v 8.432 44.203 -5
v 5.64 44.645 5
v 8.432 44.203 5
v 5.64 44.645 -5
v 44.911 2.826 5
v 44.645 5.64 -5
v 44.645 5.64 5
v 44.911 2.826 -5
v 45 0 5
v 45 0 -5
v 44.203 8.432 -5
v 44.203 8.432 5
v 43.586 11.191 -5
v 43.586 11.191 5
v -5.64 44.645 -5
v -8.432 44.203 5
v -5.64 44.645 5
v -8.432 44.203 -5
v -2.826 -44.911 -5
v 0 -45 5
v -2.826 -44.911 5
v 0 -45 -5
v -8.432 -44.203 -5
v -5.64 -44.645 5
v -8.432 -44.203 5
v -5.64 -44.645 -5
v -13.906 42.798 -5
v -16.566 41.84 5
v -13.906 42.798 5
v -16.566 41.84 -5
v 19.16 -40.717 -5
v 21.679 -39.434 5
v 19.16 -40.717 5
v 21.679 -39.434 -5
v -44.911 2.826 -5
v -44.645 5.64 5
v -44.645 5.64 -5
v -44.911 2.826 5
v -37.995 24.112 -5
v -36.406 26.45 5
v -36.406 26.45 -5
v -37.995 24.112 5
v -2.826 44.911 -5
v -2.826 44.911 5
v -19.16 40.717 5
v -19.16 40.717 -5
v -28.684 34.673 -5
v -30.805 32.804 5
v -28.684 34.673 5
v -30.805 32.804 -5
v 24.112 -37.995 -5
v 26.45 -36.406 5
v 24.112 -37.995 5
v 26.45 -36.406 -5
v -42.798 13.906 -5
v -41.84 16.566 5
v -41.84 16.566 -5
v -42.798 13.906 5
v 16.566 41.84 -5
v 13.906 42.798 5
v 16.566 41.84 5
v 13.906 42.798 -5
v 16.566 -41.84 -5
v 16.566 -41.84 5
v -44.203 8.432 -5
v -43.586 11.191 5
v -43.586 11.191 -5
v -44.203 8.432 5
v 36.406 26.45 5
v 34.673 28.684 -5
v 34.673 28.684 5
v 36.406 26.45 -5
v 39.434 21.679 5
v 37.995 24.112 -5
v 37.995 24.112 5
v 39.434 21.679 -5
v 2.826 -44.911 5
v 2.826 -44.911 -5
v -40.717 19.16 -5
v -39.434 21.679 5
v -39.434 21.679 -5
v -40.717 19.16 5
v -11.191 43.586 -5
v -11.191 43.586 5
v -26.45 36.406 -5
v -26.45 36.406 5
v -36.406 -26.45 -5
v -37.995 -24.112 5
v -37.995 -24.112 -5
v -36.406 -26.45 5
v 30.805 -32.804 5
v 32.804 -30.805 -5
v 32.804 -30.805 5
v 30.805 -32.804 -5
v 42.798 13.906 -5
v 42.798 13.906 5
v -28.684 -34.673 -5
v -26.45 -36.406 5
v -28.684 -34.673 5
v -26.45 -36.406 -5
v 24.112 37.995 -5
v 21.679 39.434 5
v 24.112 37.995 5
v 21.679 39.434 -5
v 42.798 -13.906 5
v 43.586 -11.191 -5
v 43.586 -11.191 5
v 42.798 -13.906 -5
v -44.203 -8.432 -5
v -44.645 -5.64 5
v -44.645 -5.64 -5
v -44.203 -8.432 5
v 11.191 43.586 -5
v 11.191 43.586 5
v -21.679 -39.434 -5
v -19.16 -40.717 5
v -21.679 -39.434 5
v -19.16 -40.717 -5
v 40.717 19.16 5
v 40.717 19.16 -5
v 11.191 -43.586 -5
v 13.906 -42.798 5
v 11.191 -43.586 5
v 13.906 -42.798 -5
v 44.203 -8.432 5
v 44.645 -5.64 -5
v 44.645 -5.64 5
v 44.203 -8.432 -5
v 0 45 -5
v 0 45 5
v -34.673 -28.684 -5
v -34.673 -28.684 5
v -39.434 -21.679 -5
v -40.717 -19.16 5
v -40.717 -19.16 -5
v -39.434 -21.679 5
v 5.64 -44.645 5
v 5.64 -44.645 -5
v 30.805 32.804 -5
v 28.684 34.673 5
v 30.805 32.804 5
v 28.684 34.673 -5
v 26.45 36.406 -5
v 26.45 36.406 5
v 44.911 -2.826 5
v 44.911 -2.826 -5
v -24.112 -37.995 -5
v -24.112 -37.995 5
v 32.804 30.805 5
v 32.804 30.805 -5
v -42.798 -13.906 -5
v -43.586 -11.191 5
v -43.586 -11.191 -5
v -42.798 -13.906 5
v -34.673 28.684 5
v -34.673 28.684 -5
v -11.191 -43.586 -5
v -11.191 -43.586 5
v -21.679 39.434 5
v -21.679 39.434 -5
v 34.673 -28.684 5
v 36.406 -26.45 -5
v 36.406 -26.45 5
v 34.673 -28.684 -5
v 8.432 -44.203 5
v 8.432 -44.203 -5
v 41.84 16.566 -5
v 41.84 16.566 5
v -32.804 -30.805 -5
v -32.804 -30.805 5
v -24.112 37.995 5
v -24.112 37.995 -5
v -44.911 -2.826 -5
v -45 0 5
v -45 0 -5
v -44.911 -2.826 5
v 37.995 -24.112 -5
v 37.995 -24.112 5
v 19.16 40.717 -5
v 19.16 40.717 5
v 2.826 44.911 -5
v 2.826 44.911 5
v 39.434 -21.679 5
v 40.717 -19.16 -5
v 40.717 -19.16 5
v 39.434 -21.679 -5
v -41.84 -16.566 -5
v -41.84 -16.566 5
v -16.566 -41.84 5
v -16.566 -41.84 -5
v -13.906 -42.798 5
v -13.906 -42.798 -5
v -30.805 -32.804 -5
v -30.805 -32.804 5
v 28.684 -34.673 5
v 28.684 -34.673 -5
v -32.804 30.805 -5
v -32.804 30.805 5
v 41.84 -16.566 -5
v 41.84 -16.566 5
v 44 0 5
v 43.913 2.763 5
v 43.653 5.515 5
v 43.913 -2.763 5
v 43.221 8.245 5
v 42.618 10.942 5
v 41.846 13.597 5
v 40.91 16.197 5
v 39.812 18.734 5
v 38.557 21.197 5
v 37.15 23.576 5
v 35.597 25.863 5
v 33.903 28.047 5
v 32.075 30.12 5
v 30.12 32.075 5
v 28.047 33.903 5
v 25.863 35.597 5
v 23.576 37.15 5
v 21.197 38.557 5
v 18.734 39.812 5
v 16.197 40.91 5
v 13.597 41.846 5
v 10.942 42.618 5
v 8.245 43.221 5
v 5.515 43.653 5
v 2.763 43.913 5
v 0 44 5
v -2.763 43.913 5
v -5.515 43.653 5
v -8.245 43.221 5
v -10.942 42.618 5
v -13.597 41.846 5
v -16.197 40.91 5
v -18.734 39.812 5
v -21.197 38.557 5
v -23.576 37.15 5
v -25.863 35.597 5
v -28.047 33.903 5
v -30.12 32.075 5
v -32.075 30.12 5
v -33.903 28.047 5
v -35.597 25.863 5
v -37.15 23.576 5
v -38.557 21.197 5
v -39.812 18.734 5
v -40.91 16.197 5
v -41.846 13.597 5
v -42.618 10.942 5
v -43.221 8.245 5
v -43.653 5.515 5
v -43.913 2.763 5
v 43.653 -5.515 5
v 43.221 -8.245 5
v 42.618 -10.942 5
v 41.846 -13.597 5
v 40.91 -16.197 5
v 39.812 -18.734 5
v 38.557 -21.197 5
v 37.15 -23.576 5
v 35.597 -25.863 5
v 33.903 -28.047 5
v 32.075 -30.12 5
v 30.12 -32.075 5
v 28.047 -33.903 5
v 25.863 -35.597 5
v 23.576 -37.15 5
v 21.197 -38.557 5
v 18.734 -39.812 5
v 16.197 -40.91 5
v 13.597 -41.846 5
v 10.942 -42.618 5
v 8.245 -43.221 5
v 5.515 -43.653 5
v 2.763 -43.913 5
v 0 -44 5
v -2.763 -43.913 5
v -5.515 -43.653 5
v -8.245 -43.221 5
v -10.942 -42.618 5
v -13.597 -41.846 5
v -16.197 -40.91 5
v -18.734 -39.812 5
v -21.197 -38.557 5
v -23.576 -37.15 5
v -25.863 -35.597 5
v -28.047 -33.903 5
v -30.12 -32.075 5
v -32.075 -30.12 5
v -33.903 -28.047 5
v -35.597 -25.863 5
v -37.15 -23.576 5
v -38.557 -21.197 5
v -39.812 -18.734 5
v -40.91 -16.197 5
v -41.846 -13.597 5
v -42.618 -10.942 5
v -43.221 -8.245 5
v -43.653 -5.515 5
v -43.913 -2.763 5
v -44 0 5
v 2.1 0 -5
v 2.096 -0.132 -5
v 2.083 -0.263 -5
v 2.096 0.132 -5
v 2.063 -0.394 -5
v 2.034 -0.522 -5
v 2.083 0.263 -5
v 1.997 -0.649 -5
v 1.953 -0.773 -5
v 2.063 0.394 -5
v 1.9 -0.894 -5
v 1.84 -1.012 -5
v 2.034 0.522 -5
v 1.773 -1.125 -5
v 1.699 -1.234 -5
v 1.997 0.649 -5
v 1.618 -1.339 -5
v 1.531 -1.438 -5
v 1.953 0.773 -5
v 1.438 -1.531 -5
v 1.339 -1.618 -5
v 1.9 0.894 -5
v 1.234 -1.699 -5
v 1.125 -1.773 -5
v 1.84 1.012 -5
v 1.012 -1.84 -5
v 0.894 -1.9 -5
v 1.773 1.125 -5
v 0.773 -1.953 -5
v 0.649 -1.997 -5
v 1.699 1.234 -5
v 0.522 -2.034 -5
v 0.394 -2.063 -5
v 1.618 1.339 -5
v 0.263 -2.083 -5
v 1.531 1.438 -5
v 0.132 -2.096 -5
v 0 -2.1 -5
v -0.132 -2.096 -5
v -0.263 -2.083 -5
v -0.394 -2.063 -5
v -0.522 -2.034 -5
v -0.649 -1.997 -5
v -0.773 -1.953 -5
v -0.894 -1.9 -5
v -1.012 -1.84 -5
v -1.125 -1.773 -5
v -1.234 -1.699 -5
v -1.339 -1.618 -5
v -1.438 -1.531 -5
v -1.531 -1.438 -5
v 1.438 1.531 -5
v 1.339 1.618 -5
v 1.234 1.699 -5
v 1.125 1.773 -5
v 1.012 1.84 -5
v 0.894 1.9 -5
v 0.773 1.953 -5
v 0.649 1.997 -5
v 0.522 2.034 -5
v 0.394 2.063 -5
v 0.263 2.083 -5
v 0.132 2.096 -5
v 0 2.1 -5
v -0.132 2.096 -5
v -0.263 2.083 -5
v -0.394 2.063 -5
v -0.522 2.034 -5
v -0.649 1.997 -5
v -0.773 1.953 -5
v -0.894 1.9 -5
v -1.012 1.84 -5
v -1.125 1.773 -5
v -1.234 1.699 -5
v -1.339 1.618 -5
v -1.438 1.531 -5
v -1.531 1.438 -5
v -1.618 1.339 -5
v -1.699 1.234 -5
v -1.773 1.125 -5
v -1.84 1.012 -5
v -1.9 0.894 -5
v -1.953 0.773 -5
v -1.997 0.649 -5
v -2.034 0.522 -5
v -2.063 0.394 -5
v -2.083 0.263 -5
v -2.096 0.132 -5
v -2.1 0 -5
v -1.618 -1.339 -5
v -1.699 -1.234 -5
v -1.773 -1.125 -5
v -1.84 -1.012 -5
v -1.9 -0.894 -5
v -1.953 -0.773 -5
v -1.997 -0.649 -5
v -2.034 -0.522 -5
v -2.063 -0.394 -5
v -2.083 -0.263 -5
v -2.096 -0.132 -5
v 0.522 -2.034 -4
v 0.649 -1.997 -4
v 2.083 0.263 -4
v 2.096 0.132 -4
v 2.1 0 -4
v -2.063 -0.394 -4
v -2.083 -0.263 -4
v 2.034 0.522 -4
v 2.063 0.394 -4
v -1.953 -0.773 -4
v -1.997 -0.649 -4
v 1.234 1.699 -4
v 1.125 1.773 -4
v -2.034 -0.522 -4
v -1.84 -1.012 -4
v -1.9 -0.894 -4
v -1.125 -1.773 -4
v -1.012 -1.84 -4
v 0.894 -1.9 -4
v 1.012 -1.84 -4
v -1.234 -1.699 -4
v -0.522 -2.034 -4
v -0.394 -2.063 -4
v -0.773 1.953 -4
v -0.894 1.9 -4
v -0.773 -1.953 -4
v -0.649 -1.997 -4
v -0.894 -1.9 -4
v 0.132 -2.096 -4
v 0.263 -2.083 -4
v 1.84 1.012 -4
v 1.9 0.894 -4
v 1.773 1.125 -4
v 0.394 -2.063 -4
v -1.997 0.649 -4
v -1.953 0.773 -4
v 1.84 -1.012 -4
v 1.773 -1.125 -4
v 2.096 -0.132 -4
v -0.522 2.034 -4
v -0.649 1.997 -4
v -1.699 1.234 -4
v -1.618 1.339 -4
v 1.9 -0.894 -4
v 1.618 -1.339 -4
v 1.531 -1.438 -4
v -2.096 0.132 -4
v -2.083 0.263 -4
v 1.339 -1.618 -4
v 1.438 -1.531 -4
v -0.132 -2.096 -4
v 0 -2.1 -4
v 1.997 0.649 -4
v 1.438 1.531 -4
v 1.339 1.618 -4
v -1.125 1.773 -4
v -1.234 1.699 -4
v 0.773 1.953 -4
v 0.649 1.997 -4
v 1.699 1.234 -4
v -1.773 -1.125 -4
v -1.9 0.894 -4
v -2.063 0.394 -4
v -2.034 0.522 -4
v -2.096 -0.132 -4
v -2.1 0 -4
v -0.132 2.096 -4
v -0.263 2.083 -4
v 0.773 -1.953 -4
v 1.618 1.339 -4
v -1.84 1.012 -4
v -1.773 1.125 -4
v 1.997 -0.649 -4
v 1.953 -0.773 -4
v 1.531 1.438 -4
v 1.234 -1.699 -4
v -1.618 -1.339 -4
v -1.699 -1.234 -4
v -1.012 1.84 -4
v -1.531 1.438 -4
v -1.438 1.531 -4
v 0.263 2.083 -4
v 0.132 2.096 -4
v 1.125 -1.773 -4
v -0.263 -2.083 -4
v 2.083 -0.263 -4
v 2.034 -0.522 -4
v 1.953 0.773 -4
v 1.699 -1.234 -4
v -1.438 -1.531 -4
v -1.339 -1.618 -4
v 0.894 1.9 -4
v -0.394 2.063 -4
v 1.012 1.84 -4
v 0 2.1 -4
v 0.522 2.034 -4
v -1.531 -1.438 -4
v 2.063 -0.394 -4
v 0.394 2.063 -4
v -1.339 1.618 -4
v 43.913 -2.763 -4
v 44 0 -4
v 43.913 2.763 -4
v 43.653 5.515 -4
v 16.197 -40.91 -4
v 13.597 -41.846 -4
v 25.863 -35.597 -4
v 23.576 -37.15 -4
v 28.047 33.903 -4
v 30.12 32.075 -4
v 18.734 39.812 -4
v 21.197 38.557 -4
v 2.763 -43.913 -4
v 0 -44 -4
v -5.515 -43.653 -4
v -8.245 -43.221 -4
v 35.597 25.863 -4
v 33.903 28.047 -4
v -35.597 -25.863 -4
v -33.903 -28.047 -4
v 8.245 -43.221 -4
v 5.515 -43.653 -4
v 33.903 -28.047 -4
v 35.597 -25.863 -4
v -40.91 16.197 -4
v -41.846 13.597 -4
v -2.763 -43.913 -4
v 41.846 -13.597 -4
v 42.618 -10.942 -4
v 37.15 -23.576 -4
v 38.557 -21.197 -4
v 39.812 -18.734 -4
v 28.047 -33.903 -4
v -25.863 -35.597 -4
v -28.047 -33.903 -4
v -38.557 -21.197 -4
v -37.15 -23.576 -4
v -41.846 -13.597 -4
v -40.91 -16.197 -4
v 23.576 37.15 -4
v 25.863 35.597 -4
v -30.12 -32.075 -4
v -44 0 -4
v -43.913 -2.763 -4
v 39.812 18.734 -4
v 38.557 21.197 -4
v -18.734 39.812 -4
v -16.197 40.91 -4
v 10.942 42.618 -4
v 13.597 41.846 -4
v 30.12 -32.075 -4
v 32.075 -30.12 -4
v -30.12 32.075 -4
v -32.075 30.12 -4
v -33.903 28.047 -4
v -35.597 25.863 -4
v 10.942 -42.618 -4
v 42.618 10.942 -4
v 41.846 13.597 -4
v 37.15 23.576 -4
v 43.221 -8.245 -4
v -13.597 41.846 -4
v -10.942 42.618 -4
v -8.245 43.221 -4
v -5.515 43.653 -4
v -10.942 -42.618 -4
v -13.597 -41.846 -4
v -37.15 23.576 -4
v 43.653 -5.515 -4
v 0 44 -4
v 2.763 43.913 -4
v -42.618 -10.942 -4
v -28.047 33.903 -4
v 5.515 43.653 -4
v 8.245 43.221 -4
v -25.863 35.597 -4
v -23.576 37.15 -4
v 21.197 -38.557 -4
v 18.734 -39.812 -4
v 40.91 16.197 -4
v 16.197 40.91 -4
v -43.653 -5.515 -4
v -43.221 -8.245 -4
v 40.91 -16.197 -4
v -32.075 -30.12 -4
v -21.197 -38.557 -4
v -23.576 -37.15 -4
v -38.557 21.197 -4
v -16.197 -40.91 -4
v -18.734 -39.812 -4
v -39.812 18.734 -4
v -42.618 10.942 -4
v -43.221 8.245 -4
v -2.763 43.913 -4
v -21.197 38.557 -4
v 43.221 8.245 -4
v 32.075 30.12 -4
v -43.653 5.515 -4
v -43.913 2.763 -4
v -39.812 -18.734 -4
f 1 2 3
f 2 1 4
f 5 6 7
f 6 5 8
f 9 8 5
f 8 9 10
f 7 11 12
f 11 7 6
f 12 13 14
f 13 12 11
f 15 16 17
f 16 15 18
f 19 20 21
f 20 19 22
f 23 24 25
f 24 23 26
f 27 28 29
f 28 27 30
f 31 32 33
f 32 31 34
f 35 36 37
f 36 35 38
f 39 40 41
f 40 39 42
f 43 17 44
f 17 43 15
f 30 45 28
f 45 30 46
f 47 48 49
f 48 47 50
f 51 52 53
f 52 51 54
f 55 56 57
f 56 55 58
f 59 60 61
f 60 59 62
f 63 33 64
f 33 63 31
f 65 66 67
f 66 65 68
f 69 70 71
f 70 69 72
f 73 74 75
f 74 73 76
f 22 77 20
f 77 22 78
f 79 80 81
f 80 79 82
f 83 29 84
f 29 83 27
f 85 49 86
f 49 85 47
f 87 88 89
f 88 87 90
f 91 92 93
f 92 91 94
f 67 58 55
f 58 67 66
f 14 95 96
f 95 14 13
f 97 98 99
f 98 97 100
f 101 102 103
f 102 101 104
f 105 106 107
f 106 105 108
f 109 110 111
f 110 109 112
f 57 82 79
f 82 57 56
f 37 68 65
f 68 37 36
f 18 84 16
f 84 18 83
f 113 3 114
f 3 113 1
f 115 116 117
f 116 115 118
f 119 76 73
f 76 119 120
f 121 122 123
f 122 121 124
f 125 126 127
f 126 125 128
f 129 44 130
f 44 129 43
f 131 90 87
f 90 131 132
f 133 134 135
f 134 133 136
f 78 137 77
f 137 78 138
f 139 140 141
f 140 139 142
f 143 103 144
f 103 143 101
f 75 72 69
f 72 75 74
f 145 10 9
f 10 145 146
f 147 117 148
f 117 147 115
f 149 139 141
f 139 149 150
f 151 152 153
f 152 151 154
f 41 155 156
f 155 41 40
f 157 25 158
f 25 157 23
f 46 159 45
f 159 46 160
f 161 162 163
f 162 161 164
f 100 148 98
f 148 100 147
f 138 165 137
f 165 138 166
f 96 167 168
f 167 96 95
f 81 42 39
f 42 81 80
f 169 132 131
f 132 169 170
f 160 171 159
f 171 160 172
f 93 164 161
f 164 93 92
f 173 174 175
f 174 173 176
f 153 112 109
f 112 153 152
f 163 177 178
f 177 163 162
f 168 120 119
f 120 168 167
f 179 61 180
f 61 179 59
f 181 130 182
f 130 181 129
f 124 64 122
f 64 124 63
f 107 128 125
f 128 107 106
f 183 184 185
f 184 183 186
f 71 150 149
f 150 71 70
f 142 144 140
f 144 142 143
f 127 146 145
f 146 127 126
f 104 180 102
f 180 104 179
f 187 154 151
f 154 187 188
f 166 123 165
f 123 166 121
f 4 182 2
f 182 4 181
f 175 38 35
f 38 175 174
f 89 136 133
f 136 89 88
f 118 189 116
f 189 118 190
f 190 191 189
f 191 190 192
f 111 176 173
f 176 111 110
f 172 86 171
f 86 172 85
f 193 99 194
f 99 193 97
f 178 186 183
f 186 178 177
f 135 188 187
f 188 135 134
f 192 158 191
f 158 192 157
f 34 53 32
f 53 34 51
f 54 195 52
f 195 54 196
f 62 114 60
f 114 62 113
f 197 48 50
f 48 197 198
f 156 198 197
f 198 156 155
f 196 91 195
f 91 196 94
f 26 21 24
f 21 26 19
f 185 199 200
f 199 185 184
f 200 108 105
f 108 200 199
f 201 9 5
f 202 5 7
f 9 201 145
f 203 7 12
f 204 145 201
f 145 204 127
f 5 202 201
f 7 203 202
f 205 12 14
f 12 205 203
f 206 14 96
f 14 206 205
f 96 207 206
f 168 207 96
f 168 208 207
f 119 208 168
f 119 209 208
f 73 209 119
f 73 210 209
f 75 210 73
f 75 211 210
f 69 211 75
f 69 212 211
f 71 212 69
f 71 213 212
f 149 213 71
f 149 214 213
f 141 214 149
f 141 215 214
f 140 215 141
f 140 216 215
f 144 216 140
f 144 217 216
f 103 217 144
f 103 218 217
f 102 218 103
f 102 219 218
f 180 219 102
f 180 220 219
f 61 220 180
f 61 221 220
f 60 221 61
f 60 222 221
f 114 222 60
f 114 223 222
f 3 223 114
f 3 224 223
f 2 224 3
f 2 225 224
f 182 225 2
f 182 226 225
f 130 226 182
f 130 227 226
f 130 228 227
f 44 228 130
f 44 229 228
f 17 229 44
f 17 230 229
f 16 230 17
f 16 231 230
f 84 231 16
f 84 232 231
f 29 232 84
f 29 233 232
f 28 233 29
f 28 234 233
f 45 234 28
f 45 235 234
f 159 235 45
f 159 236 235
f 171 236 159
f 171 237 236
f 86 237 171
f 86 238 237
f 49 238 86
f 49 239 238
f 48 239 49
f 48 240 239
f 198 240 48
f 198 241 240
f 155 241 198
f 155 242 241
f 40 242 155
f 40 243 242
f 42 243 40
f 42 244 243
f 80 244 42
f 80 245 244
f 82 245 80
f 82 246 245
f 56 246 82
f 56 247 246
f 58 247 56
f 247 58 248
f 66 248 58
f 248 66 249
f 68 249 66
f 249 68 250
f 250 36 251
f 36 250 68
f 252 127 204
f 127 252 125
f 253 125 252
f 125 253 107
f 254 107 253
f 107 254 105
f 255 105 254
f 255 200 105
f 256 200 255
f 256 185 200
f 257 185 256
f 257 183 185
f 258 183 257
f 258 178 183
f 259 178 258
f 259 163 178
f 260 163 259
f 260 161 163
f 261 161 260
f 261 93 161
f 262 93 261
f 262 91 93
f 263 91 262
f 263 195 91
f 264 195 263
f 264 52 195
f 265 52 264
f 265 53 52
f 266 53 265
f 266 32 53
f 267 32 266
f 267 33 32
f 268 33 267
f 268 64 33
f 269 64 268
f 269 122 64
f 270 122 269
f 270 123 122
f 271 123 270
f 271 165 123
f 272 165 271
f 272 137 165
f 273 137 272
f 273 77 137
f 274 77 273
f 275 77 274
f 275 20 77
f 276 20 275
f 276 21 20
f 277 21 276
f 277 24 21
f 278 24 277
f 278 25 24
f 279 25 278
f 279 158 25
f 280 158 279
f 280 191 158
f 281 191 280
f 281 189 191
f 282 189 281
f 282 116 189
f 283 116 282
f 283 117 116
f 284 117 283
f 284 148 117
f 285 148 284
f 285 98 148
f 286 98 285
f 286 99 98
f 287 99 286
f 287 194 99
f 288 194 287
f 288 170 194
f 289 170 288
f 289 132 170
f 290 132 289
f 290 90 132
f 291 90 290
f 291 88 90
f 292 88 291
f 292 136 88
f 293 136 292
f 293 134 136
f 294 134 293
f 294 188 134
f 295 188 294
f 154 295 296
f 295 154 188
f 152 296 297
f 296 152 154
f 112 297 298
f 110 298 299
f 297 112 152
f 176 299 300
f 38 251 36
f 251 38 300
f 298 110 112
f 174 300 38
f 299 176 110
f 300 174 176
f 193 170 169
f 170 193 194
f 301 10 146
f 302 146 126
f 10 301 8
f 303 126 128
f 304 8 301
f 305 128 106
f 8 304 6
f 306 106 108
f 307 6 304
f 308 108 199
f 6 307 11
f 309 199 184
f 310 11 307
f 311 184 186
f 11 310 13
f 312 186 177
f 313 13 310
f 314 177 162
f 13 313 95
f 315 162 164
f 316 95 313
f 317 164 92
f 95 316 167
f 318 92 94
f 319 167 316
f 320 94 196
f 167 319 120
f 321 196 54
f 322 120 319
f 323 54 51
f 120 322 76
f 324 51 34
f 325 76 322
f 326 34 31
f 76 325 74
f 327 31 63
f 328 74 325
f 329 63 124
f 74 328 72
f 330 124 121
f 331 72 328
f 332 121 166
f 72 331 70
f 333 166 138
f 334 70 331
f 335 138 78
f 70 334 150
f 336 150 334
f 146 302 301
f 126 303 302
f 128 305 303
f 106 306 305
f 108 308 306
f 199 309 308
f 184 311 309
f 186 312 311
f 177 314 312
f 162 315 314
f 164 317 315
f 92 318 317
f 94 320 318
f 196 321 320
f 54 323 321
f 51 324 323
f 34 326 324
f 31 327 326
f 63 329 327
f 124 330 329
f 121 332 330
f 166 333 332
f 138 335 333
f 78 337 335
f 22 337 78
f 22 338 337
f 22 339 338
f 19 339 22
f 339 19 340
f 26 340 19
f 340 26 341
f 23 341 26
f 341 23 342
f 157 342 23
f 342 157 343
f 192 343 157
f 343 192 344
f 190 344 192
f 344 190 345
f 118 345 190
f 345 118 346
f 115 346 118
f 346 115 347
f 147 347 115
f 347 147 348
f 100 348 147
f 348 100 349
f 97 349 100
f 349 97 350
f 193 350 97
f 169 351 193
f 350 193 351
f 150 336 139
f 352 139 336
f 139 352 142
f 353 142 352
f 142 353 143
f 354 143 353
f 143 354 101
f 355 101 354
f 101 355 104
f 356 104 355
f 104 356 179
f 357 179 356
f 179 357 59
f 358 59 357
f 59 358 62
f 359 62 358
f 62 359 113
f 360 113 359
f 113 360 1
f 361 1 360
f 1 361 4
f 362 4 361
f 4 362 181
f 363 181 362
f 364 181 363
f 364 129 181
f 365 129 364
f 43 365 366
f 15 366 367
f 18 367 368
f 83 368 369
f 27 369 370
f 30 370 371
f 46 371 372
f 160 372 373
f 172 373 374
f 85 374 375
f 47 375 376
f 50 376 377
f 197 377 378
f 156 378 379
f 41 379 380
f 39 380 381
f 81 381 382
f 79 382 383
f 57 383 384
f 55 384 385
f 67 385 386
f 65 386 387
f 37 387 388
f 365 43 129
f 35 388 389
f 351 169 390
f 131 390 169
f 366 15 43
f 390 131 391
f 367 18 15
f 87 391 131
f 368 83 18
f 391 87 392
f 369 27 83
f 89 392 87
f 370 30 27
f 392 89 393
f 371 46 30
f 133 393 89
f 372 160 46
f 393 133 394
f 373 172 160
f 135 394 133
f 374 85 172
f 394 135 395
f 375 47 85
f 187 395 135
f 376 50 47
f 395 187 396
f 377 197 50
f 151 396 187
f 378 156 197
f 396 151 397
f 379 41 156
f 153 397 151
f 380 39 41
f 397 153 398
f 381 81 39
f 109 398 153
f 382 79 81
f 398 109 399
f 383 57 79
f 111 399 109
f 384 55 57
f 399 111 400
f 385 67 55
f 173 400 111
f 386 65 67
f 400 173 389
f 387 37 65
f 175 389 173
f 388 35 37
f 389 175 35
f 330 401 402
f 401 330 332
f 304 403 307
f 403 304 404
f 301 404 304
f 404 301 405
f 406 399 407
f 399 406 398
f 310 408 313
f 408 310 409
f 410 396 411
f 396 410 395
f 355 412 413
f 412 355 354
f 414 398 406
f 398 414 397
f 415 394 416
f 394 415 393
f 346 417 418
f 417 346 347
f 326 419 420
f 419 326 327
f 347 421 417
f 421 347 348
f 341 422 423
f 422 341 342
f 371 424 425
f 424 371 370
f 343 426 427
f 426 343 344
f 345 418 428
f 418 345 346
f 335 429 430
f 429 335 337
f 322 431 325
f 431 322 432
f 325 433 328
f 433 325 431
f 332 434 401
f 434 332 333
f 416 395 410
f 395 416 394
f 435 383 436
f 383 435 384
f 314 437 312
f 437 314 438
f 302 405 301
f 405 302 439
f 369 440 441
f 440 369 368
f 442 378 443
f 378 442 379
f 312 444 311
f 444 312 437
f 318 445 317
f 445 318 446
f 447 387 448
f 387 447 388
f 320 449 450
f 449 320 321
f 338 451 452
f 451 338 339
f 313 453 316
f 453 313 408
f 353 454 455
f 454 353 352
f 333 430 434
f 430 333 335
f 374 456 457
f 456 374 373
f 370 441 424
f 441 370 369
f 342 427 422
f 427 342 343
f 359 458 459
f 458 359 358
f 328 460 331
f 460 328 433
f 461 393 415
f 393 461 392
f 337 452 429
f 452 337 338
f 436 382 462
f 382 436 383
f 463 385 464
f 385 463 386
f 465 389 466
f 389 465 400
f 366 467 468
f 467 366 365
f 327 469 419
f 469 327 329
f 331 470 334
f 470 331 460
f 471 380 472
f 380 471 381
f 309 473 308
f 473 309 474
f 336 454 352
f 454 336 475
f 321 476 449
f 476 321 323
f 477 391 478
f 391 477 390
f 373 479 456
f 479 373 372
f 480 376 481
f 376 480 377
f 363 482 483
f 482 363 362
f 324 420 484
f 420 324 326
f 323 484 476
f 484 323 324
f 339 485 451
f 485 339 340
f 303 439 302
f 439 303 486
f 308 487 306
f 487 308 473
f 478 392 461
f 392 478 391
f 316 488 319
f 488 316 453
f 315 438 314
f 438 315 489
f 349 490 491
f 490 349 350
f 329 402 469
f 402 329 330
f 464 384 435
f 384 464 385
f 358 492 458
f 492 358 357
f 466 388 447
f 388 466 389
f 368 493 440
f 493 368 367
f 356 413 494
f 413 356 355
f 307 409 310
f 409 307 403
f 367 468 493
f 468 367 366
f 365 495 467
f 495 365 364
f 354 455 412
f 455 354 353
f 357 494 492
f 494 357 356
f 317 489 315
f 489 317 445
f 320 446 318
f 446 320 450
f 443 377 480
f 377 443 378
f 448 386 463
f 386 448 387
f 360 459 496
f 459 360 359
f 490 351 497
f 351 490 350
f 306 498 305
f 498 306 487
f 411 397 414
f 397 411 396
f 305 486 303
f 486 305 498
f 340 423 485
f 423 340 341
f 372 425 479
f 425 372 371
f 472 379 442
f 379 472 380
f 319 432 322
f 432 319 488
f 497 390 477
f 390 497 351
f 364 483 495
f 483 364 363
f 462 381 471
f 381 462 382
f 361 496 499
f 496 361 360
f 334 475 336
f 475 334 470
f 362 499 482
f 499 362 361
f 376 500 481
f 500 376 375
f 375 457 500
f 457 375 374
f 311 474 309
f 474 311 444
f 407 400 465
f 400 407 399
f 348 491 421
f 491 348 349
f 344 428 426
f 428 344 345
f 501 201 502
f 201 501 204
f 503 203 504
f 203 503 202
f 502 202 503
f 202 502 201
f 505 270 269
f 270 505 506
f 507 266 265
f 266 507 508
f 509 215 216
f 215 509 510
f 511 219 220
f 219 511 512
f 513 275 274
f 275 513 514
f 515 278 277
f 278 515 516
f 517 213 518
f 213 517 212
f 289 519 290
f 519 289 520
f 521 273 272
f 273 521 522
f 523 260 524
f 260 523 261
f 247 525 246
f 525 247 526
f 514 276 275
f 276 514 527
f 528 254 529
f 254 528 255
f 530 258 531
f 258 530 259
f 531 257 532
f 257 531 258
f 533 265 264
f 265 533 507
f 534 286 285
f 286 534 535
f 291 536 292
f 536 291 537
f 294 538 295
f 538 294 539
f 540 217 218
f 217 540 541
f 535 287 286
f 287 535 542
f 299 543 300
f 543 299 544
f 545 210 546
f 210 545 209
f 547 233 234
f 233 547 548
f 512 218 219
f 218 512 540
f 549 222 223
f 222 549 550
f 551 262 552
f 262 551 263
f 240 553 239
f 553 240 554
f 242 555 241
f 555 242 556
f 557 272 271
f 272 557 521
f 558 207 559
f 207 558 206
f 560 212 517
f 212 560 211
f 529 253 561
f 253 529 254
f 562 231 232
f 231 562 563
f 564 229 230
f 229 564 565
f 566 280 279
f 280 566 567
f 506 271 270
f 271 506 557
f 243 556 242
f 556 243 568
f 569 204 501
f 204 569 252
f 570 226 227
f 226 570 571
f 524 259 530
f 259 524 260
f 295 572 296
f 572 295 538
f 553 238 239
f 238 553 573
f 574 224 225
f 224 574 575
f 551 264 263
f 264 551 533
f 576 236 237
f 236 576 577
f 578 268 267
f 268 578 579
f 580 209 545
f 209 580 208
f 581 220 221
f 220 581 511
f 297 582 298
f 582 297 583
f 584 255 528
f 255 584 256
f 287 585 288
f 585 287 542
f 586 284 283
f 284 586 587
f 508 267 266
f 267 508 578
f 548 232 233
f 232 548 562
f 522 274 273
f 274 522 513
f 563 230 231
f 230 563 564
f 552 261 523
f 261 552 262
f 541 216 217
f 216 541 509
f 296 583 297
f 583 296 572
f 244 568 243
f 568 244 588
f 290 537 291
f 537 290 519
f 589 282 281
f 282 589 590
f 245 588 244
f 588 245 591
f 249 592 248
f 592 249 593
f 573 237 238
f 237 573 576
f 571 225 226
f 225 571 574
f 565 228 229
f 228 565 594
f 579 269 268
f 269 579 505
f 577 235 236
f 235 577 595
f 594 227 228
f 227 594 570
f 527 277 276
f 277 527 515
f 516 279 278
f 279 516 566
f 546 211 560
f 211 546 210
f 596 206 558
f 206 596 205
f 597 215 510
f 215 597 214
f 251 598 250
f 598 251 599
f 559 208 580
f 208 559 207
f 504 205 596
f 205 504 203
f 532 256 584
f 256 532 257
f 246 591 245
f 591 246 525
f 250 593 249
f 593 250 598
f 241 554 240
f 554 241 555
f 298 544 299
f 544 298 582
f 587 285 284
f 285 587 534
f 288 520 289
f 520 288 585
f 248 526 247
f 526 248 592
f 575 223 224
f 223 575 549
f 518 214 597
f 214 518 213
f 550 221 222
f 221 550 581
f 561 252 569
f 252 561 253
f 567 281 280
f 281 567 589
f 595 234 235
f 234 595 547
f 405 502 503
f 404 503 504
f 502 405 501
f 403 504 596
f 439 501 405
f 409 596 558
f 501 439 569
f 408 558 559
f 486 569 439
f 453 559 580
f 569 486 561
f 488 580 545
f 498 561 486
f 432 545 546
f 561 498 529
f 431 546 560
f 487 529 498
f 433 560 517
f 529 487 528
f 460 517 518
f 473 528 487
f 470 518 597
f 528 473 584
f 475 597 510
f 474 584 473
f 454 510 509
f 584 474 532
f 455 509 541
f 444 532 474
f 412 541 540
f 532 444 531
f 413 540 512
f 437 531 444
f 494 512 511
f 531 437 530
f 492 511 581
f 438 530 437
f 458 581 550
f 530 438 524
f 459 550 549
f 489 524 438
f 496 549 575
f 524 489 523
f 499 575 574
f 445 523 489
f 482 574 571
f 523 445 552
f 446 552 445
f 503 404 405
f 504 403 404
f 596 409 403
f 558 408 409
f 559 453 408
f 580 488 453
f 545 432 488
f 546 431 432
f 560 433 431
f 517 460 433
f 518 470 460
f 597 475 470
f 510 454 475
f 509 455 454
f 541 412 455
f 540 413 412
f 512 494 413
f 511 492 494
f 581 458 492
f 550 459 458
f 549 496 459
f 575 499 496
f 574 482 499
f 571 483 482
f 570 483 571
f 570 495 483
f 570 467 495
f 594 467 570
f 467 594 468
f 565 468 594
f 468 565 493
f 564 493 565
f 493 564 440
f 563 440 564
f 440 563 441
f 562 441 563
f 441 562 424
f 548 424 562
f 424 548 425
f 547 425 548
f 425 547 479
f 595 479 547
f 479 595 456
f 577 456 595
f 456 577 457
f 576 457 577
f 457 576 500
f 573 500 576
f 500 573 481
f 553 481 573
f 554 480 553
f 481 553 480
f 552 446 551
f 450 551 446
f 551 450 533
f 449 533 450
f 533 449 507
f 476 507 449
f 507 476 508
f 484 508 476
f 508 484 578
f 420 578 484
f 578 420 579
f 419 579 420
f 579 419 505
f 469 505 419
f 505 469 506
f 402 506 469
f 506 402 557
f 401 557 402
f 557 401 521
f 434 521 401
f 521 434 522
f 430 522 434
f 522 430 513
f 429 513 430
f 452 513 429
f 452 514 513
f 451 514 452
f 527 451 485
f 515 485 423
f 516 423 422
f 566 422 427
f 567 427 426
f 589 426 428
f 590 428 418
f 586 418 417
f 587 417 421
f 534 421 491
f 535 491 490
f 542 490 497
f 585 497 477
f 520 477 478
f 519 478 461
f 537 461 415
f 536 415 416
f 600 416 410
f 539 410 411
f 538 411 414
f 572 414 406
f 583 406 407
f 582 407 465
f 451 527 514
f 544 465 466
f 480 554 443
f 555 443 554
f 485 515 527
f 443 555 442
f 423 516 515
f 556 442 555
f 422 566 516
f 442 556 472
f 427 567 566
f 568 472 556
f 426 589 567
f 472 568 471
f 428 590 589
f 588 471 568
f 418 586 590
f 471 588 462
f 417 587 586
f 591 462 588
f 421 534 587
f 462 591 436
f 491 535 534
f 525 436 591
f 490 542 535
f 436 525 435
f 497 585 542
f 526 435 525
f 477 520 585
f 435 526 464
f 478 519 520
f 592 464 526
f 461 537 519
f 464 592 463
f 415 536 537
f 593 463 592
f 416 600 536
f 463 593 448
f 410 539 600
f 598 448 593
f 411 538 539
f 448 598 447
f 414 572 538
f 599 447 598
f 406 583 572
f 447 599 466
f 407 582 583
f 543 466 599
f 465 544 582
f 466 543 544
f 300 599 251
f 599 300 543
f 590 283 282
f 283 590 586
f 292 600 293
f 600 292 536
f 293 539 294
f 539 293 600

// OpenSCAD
grommet_radius = 2.1;
lid_radius = 45;
lid_height = 10;
lip_offset = 1;
lip_width = 1;

$fn=100;

difference() {
    cylinder(h=lid_height, r = lid_radius, center = true);
    cylinder(h=lid_height + 1, r = grommet_radius, center = true);
    translate([0, 0, lip_offset]) cylinder(h=lid_height, r = lid_radius - lip_width, center = true);
}
